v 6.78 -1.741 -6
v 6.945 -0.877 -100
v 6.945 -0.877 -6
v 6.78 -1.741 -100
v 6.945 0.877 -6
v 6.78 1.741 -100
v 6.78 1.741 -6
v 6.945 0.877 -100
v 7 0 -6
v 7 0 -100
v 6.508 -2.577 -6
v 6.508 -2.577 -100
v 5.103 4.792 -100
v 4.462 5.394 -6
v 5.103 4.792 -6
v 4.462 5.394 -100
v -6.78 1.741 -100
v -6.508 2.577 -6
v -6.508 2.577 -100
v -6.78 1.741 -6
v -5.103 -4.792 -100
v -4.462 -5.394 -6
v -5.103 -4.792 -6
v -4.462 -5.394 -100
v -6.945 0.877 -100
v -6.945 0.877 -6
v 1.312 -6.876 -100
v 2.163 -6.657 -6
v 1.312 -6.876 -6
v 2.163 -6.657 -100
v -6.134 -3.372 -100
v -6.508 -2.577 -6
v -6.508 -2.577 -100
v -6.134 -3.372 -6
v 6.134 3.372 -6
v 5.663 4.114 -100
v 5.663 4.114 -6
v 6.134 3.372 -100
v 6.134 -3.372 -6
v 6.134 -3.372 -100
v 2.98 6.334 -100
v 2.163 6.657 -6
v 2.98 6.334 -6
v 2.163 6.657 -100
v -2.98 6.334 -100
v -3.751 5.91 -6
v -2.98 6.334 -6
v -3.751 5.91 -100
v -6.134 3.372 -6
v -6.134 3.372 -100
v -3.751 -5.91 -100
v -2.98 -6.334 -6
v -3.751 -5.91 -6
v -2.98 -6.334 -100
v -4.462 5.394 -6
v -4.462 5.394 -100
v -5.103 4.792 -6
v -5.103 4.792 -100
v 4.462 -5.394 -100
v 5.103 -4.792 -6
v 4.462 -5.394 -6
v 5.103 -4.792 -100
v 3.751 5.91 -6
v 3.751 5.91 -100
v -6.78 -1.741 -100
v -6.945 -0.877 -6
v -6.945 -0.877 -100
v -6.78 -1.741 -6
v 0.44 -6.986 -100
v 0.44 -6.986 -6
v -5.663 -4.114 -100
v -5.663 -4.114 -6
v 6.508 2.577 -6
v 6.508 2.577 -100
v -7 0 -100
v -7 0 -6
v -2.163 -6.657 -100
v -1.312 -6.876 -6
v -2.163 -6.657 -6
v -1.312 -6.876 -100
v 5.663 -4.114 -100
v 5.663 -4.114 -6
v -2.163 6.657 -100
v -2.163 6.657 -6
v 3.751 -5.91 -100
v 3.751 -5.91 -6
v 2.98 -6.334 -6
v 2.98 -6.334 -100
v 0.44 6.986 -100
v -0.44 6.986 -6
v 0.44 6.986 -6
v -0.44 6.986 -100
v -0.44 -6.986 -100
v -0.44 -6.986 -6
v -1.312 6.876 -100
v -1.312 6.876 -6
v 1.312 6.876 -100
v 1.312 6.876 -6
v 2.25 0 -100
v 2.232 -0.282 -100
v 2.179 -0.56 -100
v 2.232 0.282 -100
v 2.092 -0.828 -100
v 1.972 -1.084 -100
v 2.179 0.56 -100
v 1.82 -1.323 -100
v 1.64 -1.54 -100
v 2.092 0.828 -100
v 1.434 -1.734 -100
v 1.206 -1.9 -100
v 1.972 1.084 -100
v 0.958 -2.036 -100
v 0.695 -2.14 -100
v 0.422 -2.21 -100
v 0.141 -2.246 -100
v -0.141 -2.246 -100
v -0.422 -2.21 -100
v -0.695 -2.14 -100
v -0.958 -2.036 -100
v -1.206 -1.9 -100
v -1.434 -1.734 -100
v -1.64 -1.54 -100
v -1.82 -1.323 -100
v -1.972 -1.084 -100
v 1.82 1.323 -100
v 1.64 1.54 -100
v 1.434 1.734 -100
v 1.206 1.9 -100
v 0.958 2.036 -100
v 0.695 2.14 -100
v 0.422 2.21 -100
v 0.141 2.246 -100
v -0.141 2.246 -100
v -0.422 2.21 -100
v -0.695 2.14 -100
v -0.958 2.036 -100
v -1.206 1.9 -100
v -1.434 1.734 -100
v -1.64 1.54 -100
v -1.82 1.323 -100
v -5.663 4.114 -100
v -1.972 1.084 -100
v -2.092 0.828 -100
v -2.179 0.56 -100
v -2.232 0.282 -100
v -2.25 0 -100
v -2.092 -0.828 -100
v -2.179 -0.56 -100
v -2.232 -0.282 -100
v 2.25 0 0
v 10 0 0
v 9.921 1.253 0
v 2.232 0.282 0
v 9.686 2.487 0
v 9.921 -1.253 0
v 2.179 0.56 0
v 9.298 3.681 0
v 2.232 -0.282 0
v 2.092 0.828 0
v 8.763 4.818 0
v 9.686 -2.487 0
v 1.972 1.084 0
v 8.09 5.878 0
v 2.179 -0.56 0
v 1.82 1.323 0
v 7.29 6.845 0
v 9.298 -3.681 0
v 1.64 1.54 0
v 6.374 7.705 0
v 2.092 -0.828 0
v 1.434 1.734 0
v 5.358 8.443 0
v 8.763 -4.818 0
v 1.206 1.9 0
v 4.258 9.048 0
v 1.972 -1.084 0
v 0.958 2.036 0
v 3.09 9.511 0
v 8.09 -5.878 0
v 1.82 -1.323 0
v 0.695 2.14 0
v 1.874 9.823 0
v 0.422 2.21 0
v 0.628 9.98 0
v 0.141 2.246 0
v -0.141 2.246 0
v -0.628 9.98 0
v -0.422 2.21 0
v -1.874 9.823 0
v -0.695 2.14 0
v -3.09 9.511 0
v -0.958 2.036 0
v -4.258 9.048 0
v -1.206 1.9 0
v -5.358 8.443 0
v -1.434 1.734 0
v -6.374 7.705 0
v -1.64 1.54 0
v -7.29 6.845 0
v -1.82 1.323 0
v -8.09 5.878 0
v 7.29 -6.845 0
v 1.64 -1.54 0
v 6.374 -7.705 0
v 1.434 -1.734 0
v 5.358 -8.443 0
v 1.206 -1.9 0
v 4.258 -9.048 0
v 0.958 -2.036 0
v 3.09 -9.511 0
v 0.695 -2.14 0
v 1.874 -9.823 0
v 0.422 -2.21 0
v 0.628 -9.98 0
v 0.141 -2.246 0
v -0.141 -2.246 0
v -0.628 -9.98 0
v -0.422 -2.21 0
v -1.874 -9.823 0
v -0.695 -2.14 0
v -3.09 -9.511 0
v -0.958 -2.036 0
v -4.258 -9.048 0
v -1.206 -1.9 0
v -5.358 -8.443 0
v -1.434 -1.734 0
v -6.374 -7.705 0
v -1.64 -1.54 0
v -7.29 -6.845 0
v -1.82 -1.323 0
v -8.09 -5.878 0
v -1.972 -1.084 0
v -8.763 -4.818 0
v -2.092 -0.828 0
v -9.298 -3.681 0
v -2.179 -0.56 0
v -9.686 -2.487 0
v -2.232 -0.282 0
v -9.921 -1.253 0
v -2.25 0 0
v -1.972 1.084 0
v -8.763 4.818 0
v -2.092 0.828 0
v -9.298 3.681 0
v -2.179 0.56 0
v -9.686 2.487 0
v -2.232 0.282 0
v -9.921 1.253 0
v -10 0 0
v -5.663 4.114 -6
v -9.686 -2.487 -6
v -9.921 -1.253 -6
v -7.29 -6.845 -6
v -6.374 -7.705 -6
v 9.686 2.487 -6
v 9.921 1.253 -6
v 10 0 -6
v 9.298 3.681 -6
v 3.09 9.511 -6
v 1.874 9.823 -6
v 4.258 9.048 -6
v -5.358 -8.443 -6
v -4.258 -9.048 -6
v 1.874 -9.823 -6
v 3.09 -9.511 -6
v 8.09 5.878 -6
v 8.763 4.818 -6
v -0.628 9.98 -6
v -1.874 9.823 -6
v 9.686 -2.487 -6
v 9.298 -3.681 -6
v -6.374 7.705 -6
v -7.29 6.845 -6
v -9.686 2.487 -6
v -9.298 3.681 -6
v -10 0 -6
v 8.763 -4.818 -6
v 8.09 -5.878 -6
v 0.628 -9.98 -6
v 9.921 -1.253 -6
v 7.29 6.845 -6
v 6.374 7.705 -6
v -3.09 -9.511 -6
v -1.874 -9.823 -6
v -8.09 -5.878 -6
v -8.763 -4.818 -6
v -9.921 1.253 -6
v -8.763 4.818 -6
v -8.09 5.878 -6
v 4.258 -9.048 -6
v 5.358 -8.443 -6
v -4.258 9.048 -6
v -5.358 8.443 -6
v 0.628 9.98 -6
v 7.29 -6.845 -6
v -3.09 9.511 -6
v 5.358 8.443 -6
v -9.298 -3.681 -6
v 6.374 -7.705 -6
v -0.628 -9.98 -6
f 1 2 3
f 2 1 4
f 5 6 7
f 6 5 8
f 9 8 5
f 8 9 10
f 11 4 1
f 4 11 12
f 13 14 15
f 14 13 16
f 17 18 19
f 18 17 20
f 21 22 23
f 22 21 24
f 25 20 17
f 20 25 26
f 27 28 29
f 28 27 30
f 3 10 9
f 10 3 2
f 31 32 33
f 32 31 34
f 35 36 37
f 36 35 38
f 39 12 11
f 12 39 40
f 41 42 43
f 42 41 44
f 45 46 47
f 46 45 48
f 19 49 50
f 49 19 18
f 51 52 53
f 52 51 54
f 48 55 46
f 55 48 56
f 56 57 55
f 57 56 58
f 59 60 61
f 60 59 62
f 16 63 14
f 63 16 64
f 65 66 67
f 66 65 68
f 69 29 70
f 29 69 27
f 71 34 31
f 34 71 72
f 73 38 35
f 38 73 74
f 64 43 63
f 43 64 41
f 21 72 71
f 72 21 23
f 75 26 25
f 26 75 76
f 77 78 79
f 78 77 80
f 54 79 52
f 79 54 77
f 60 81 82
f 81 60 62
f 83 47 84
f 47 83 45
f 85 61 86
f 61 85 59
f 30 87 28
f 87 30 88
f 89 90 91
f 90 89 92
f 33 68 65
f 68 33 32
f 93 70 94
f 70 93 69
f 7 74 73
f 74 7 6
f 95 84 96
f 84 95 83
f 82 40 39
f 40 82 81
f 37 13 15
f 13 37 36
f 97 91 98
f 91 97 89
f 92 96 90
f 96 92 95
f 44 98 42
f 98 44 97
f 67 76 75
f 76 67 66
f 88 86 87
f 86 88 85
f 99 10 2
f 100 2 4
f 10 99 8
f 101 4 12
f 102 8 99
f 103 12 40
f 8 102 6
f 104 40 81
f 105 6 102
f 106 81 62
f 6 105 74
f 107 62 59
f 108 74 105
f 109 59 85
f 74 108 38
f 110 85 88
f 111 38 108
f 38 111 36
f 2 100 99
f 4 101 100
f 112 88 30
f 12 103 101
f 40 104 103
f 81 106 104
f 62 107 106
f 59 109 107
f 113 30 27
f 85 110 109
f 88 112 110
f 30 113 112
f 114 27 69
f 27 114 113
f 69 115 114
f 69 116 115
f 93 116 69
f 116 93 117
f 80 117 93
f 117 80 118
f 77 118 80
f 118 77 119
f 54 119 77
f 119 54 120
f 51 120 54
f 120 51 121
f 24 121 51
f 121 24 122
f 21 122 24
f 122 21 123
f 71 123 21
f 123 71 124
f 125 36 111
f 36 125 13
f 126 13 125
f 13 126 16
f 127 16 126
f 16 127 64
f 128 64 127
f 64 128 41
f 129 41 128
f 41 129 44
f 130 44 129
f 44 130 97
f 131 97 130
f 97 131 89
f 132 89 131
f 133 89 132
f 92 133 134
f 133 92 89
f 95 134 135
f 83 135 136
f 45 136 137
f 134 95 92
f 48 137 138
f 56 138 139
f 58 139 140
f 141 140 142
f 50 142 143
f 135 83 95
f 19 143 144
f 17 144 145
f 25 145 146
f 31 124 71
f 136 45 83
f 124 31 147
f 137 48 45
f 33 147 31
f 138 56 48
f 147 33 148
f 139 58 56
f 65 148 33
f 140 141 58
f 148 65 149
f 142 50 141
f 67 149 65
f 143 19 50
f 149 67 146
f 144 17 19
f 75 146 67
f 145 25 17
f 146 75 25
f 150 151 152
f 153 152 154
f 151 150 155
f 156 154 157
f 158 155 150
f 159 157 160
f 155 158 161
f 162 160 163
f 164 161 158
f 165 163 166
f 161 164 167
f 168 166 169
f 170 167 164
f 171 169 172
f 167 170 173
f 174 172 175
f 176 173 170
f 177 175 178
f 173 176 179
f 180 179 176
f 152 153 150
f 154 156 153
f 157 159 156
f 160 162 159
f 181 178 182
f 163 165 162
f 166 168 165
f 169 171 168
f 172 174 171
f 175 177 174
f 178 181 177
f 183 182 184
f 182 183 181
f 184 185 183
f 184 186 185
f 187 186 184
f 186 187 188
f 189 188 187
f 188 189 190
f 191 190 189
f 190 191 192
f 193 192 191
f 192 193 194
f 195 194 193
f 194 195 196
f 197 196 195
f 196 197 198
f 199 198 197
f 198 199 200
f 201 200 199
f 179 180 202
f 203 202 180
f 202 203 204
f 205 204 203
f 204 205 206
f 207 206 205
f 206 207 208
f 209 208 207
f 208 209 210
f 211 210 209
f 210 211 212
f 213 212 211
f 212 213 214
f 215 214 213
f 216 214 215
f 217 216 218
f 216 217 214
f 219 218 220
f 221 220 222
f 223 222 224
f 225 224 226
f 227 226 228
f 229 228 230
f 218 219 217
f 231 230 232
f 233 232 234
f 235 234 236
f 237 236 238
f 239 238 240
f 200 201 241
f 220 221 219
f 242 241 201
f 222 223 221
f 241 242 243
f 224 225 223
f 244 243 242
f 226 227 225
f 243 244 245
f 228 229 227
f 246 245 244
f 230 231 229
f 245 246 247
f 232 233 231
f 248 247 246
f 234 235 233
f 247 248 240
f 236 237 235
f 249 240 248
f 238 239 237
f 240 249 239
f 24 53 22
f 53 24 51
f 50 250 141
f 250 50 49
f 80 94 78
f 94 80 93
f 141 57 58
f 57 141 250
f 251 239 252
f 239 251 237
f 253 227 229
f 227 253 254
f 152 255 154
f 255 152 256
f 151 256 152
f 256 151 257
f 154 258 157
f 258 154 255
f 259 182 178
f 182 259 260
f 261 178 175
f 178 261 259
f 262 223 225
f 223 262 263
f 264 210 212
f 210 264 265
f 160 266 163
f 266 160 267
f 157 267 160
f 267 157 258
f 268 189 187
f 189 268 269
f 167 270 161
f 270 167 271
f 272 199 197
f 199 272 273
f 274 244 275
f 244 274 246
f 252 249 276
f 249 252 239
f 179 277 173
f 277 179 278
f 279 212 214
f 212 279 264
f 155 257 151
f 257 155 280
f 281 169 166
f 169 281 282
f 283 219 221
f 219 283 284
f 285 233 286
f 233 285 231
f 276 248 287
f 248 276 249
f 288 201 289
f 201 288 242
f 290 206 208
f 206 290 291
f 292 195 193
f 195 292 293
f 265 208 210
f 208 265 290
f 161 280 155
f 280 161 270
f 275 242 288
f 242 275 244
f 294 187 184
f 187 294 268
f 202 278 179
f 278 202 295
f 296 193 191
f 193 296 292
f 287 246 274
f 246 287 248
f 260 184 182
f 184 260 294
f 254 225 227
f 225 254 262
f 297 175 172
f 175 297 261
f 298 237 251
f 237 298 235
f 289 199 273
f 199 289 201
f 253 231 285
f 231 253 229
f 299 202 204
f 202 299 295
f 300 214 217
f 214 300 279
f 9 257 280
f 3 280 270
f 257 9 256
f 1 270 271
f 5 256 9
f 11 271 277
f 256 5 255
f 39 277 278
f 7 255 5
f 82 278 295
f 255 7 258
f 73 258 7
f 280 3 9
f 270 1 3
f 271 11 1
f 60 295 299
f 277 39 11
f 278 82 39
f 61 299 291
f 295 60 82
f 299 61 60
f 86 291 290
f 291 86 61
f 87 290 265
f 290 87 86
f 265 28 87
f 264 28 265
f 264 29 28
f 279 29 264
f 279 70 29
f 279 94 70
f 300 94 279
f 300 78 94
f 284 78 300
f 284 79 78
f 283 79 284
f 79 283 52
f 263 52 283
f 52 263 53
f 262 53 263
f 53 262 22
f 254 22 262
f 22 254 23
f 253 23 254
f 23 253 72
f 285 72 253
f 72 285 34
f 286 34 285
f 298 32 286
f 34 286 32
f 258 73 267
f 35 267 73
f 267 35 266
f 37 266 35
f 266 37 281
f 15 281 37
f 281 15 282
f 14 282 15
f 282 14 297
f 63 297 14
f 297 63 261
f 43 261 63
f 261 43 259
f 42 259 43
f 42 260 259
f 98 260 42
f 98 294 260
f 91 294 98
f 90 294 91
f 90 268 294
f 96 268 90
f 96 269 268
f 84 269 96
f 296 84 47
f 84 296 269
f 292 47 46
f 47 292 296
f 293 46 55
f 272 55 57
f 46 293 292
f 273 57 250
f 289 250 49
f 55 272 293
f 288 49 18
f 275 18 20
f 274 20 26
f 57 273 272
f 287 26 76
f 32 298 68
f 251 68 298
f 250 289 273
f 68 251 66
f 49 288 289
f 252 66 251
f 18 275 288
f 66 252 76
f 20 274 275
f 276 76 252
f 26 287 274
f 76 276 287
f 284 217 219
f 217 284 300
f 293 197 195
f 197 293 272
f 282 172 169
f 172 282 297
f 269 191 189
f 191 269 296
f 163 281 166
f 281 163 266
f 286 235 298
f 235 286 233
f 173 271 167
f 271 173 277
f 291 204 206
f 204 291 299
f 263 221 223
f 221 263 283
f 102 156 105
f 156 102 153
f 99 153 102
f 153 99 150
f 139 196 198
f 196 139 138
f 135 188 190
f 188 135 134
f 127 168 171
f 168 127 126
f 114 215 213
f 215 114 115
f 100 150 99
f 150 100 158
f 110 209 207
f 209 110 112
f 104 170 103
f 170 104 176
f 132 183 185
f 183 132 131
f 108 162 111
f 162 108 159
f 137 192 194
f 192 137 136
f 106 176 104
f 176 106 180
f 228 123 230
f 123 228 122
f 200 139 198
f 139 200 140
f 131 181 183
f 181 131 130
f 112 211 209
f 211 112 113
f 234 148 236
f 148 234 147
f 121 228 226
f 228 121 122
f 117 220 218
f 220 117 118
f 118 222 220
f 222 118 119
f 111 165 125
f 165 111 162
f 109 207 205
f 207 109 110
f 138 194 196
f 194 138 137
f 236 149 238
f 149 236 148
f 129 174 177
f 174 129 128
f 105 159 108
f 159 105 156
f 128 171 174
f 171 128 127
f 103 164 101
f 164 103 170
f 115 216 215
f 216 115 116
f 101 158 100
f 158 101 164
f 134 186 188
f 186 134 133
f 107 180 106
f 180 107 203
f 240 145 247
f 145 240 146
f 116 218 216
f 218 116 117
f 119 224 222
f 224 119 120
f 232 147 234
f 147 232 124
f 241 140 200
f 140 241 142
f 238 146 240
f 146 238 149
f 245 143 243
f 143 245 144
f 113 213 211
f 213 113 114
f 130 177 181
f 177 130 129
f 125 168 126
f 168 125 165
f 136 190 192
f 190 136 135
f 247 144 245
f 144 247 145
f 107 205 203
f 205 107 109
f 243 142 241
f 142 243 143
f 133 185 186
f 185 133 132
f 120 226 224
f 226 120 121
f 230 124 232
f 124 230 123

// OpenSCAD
$fn = 50;


difference() {
	union() {
		translate(v = [0, 0, -100.0000000000]) {
			cylinder(h = 100, r = 7.0000000000);
		}
		translate(v = [0, 0, -6.0000000000]) {
			cylinder(h = 6, r = 10.0000000000);
		}
	}
	union() {
		#translate(v = [0, 0, -100]) {
			cylinder(h = 100, r = 2.2500000000);
		}
	}
}
